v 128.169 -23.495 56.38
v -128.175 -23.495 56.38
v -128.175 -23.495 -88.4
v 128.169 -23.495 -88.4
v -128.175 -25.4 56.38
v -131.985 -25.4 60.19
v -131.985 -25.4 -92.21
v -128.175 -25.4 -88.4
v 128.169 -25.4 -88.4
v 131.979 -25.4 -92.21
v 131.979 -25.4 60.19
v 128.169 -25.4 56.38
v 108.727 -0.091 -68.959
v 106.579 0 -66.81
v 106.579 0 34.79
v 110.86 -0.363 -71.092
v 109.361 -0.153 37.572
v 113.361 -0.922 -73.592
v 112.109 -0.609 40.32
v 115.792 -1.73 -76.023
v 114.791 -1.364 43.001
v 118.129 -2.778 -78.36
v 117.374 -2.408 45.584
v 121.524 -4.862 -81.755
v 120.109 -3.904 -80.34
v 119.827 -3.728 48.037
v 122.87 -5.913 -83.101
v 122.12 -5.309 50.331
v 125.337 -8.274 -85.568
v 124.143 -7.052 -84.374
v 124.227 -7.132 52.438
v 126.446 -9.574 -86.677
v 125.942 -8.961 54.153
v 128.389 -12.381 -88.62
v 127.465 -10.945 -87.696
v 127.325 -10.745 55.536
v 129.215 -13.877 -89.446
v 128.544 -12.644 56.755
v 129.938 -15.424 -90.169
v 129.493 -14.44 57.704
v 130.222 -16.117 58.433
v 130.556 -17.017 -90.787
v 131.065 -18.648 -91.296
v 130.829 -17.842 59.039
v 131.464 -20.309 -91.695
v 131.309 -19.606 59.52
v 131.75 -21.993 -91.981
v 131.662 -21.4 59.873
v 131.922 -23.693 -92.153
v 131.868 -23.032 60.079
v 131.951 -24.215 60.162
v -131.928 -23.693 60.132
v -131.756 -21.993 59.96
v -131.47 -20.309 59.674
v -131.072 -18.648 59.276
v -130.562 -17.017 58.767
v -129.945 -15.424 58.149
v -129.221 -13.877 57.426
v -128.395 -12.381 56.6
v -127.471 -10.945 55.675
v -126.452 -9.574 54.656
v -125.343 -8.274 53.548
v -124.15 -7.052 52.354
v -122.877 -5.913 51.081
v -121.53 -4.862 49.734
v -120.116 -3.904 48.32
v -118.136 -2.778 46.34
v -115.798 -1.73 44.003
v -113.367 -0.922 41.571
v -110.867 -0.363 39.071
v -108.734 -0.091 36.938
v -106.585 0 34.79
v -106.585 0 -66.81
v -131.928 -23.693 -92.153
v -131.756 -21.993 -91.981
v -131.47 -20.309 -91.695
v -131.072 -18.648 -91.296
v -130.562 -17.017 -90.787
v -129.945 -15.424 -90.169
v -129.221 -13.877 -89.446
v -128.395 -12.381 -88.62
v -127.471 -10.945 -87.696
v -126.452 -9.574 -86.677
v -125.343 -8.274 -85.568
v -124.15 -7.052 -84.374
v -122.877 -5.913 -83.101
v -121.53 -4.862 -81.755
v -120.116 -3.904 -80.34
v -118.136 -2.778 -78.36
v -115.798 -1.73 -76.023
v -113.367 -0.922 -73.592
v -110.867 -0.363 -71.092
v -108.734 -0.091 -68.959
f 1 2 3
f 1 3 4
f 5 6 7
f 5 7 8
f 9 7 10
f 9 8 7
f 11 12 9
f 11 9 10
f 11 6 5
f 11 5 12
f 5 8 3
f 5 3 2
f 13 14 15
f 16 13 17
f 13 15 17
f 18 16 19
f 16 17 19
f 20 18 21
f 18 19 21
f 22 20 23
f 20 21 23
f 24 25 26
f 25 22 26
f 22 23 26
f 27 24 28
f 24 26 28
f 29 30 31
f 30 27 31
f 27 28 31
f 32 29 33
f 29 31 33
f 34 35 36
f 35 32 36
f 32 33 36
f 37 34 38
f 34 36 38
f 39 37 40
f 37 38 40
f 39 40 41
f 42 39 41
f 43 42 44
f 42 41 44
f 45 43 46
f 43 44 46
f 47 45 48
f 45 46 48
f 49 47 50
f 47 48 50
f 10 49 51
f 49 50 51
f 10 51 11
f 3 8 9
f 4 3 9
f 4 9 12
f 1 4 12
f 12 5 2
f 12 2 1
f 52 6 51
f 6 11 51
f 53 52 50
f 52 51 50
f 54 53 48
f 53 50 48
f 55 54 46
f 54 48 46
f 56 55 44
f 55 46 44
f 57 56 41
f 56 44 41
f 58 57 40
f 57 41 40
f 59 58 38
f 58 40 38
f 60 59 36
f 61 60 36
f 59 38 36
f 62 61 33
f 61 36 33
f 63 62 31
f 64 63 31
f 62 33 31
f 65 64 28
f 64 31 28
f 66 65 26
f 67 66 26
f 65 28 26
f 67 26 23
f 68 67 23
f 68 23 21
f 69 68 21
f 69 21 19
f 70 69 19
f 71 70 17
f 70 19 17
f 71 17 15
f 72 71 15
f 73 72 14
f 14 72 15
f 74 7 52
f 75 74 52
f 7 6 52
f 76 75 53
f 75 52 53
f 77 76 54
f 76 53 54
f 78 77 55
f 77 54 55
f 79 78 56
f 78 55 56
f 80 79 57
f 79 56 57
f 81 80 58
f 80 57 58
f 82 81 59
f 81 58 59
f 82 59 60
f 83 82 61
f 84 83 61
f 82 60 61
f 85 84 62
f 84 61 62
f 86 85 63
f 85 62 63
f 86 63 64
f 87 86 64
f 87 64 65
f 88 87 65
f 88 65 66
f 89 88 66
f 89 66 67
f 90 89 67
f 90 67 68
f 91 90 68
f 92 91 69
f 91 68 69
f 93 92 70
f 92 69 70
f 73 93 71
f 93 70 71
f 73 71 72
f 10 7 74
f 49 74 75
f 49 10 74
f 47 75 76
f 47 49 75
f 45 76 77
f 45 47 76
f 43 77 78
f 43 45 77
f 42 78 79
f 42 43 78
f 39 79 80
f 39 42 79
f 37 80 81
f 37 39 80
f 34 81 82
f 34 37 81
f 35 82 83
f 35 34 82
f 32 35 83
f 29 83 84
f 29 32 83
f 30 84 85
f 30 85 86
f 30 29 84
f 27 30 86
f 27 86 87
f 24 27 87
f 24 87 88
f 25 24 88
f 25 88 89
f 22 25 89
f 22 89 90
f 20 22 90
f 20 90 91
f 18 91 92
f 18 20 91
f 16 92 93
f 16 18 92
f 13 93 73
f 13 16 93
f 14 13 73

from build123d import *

# Parameters (mm, degrees)
F0_W     = 263.9645430735
F0_H     = 152.4
F1_DEPTH = 25.4
F2_W     = 256.3445430735
F2_H     = 144.78
F3_DEPTH = 1.905
F4_R     = 25.39999


# Not quite as in the source:
# - a fillet or chamfer is up to 0.001 mm smaller than in the source, because OpenCascade refuses the exact size


with BuildPart() as f1:
    # F0 (on Front) → F1 (new body)
    with BuildSketch(Plane.XZ):
        with Locations((-0.0032023633, -16.0101552037)):
            Rectangle(F0_W, F0_H)
    extrude(amount=F1_DEPTH)

    # F2 (on face) → F3 (cut)
    with BuildSketch(Plane.XZ.offset(25.4)):
        with Locations((-0.0032023633, -16.0101552037)):
            Rectangle(F2_W, F2_H)
    extrude(amount=-F3_DEPTH, mode=Mode.SUBTRACT)

    # F4 (radius 25.4 in the source; OpenCascade refuses exactly that, so slightly less here)
    f4_edges = [f1.edges().sort_by_distance(p)[0] for p in [
        (-0.003202, 0, -92.210155),
        (131.979069, 0, -16.010155),
        (-0.003202, 0, 60.189845),
        (-131.985474, 0, -16.010155),
    ]]
    fillet(f4_edges, radius=F4_R)


solid = f1.part
